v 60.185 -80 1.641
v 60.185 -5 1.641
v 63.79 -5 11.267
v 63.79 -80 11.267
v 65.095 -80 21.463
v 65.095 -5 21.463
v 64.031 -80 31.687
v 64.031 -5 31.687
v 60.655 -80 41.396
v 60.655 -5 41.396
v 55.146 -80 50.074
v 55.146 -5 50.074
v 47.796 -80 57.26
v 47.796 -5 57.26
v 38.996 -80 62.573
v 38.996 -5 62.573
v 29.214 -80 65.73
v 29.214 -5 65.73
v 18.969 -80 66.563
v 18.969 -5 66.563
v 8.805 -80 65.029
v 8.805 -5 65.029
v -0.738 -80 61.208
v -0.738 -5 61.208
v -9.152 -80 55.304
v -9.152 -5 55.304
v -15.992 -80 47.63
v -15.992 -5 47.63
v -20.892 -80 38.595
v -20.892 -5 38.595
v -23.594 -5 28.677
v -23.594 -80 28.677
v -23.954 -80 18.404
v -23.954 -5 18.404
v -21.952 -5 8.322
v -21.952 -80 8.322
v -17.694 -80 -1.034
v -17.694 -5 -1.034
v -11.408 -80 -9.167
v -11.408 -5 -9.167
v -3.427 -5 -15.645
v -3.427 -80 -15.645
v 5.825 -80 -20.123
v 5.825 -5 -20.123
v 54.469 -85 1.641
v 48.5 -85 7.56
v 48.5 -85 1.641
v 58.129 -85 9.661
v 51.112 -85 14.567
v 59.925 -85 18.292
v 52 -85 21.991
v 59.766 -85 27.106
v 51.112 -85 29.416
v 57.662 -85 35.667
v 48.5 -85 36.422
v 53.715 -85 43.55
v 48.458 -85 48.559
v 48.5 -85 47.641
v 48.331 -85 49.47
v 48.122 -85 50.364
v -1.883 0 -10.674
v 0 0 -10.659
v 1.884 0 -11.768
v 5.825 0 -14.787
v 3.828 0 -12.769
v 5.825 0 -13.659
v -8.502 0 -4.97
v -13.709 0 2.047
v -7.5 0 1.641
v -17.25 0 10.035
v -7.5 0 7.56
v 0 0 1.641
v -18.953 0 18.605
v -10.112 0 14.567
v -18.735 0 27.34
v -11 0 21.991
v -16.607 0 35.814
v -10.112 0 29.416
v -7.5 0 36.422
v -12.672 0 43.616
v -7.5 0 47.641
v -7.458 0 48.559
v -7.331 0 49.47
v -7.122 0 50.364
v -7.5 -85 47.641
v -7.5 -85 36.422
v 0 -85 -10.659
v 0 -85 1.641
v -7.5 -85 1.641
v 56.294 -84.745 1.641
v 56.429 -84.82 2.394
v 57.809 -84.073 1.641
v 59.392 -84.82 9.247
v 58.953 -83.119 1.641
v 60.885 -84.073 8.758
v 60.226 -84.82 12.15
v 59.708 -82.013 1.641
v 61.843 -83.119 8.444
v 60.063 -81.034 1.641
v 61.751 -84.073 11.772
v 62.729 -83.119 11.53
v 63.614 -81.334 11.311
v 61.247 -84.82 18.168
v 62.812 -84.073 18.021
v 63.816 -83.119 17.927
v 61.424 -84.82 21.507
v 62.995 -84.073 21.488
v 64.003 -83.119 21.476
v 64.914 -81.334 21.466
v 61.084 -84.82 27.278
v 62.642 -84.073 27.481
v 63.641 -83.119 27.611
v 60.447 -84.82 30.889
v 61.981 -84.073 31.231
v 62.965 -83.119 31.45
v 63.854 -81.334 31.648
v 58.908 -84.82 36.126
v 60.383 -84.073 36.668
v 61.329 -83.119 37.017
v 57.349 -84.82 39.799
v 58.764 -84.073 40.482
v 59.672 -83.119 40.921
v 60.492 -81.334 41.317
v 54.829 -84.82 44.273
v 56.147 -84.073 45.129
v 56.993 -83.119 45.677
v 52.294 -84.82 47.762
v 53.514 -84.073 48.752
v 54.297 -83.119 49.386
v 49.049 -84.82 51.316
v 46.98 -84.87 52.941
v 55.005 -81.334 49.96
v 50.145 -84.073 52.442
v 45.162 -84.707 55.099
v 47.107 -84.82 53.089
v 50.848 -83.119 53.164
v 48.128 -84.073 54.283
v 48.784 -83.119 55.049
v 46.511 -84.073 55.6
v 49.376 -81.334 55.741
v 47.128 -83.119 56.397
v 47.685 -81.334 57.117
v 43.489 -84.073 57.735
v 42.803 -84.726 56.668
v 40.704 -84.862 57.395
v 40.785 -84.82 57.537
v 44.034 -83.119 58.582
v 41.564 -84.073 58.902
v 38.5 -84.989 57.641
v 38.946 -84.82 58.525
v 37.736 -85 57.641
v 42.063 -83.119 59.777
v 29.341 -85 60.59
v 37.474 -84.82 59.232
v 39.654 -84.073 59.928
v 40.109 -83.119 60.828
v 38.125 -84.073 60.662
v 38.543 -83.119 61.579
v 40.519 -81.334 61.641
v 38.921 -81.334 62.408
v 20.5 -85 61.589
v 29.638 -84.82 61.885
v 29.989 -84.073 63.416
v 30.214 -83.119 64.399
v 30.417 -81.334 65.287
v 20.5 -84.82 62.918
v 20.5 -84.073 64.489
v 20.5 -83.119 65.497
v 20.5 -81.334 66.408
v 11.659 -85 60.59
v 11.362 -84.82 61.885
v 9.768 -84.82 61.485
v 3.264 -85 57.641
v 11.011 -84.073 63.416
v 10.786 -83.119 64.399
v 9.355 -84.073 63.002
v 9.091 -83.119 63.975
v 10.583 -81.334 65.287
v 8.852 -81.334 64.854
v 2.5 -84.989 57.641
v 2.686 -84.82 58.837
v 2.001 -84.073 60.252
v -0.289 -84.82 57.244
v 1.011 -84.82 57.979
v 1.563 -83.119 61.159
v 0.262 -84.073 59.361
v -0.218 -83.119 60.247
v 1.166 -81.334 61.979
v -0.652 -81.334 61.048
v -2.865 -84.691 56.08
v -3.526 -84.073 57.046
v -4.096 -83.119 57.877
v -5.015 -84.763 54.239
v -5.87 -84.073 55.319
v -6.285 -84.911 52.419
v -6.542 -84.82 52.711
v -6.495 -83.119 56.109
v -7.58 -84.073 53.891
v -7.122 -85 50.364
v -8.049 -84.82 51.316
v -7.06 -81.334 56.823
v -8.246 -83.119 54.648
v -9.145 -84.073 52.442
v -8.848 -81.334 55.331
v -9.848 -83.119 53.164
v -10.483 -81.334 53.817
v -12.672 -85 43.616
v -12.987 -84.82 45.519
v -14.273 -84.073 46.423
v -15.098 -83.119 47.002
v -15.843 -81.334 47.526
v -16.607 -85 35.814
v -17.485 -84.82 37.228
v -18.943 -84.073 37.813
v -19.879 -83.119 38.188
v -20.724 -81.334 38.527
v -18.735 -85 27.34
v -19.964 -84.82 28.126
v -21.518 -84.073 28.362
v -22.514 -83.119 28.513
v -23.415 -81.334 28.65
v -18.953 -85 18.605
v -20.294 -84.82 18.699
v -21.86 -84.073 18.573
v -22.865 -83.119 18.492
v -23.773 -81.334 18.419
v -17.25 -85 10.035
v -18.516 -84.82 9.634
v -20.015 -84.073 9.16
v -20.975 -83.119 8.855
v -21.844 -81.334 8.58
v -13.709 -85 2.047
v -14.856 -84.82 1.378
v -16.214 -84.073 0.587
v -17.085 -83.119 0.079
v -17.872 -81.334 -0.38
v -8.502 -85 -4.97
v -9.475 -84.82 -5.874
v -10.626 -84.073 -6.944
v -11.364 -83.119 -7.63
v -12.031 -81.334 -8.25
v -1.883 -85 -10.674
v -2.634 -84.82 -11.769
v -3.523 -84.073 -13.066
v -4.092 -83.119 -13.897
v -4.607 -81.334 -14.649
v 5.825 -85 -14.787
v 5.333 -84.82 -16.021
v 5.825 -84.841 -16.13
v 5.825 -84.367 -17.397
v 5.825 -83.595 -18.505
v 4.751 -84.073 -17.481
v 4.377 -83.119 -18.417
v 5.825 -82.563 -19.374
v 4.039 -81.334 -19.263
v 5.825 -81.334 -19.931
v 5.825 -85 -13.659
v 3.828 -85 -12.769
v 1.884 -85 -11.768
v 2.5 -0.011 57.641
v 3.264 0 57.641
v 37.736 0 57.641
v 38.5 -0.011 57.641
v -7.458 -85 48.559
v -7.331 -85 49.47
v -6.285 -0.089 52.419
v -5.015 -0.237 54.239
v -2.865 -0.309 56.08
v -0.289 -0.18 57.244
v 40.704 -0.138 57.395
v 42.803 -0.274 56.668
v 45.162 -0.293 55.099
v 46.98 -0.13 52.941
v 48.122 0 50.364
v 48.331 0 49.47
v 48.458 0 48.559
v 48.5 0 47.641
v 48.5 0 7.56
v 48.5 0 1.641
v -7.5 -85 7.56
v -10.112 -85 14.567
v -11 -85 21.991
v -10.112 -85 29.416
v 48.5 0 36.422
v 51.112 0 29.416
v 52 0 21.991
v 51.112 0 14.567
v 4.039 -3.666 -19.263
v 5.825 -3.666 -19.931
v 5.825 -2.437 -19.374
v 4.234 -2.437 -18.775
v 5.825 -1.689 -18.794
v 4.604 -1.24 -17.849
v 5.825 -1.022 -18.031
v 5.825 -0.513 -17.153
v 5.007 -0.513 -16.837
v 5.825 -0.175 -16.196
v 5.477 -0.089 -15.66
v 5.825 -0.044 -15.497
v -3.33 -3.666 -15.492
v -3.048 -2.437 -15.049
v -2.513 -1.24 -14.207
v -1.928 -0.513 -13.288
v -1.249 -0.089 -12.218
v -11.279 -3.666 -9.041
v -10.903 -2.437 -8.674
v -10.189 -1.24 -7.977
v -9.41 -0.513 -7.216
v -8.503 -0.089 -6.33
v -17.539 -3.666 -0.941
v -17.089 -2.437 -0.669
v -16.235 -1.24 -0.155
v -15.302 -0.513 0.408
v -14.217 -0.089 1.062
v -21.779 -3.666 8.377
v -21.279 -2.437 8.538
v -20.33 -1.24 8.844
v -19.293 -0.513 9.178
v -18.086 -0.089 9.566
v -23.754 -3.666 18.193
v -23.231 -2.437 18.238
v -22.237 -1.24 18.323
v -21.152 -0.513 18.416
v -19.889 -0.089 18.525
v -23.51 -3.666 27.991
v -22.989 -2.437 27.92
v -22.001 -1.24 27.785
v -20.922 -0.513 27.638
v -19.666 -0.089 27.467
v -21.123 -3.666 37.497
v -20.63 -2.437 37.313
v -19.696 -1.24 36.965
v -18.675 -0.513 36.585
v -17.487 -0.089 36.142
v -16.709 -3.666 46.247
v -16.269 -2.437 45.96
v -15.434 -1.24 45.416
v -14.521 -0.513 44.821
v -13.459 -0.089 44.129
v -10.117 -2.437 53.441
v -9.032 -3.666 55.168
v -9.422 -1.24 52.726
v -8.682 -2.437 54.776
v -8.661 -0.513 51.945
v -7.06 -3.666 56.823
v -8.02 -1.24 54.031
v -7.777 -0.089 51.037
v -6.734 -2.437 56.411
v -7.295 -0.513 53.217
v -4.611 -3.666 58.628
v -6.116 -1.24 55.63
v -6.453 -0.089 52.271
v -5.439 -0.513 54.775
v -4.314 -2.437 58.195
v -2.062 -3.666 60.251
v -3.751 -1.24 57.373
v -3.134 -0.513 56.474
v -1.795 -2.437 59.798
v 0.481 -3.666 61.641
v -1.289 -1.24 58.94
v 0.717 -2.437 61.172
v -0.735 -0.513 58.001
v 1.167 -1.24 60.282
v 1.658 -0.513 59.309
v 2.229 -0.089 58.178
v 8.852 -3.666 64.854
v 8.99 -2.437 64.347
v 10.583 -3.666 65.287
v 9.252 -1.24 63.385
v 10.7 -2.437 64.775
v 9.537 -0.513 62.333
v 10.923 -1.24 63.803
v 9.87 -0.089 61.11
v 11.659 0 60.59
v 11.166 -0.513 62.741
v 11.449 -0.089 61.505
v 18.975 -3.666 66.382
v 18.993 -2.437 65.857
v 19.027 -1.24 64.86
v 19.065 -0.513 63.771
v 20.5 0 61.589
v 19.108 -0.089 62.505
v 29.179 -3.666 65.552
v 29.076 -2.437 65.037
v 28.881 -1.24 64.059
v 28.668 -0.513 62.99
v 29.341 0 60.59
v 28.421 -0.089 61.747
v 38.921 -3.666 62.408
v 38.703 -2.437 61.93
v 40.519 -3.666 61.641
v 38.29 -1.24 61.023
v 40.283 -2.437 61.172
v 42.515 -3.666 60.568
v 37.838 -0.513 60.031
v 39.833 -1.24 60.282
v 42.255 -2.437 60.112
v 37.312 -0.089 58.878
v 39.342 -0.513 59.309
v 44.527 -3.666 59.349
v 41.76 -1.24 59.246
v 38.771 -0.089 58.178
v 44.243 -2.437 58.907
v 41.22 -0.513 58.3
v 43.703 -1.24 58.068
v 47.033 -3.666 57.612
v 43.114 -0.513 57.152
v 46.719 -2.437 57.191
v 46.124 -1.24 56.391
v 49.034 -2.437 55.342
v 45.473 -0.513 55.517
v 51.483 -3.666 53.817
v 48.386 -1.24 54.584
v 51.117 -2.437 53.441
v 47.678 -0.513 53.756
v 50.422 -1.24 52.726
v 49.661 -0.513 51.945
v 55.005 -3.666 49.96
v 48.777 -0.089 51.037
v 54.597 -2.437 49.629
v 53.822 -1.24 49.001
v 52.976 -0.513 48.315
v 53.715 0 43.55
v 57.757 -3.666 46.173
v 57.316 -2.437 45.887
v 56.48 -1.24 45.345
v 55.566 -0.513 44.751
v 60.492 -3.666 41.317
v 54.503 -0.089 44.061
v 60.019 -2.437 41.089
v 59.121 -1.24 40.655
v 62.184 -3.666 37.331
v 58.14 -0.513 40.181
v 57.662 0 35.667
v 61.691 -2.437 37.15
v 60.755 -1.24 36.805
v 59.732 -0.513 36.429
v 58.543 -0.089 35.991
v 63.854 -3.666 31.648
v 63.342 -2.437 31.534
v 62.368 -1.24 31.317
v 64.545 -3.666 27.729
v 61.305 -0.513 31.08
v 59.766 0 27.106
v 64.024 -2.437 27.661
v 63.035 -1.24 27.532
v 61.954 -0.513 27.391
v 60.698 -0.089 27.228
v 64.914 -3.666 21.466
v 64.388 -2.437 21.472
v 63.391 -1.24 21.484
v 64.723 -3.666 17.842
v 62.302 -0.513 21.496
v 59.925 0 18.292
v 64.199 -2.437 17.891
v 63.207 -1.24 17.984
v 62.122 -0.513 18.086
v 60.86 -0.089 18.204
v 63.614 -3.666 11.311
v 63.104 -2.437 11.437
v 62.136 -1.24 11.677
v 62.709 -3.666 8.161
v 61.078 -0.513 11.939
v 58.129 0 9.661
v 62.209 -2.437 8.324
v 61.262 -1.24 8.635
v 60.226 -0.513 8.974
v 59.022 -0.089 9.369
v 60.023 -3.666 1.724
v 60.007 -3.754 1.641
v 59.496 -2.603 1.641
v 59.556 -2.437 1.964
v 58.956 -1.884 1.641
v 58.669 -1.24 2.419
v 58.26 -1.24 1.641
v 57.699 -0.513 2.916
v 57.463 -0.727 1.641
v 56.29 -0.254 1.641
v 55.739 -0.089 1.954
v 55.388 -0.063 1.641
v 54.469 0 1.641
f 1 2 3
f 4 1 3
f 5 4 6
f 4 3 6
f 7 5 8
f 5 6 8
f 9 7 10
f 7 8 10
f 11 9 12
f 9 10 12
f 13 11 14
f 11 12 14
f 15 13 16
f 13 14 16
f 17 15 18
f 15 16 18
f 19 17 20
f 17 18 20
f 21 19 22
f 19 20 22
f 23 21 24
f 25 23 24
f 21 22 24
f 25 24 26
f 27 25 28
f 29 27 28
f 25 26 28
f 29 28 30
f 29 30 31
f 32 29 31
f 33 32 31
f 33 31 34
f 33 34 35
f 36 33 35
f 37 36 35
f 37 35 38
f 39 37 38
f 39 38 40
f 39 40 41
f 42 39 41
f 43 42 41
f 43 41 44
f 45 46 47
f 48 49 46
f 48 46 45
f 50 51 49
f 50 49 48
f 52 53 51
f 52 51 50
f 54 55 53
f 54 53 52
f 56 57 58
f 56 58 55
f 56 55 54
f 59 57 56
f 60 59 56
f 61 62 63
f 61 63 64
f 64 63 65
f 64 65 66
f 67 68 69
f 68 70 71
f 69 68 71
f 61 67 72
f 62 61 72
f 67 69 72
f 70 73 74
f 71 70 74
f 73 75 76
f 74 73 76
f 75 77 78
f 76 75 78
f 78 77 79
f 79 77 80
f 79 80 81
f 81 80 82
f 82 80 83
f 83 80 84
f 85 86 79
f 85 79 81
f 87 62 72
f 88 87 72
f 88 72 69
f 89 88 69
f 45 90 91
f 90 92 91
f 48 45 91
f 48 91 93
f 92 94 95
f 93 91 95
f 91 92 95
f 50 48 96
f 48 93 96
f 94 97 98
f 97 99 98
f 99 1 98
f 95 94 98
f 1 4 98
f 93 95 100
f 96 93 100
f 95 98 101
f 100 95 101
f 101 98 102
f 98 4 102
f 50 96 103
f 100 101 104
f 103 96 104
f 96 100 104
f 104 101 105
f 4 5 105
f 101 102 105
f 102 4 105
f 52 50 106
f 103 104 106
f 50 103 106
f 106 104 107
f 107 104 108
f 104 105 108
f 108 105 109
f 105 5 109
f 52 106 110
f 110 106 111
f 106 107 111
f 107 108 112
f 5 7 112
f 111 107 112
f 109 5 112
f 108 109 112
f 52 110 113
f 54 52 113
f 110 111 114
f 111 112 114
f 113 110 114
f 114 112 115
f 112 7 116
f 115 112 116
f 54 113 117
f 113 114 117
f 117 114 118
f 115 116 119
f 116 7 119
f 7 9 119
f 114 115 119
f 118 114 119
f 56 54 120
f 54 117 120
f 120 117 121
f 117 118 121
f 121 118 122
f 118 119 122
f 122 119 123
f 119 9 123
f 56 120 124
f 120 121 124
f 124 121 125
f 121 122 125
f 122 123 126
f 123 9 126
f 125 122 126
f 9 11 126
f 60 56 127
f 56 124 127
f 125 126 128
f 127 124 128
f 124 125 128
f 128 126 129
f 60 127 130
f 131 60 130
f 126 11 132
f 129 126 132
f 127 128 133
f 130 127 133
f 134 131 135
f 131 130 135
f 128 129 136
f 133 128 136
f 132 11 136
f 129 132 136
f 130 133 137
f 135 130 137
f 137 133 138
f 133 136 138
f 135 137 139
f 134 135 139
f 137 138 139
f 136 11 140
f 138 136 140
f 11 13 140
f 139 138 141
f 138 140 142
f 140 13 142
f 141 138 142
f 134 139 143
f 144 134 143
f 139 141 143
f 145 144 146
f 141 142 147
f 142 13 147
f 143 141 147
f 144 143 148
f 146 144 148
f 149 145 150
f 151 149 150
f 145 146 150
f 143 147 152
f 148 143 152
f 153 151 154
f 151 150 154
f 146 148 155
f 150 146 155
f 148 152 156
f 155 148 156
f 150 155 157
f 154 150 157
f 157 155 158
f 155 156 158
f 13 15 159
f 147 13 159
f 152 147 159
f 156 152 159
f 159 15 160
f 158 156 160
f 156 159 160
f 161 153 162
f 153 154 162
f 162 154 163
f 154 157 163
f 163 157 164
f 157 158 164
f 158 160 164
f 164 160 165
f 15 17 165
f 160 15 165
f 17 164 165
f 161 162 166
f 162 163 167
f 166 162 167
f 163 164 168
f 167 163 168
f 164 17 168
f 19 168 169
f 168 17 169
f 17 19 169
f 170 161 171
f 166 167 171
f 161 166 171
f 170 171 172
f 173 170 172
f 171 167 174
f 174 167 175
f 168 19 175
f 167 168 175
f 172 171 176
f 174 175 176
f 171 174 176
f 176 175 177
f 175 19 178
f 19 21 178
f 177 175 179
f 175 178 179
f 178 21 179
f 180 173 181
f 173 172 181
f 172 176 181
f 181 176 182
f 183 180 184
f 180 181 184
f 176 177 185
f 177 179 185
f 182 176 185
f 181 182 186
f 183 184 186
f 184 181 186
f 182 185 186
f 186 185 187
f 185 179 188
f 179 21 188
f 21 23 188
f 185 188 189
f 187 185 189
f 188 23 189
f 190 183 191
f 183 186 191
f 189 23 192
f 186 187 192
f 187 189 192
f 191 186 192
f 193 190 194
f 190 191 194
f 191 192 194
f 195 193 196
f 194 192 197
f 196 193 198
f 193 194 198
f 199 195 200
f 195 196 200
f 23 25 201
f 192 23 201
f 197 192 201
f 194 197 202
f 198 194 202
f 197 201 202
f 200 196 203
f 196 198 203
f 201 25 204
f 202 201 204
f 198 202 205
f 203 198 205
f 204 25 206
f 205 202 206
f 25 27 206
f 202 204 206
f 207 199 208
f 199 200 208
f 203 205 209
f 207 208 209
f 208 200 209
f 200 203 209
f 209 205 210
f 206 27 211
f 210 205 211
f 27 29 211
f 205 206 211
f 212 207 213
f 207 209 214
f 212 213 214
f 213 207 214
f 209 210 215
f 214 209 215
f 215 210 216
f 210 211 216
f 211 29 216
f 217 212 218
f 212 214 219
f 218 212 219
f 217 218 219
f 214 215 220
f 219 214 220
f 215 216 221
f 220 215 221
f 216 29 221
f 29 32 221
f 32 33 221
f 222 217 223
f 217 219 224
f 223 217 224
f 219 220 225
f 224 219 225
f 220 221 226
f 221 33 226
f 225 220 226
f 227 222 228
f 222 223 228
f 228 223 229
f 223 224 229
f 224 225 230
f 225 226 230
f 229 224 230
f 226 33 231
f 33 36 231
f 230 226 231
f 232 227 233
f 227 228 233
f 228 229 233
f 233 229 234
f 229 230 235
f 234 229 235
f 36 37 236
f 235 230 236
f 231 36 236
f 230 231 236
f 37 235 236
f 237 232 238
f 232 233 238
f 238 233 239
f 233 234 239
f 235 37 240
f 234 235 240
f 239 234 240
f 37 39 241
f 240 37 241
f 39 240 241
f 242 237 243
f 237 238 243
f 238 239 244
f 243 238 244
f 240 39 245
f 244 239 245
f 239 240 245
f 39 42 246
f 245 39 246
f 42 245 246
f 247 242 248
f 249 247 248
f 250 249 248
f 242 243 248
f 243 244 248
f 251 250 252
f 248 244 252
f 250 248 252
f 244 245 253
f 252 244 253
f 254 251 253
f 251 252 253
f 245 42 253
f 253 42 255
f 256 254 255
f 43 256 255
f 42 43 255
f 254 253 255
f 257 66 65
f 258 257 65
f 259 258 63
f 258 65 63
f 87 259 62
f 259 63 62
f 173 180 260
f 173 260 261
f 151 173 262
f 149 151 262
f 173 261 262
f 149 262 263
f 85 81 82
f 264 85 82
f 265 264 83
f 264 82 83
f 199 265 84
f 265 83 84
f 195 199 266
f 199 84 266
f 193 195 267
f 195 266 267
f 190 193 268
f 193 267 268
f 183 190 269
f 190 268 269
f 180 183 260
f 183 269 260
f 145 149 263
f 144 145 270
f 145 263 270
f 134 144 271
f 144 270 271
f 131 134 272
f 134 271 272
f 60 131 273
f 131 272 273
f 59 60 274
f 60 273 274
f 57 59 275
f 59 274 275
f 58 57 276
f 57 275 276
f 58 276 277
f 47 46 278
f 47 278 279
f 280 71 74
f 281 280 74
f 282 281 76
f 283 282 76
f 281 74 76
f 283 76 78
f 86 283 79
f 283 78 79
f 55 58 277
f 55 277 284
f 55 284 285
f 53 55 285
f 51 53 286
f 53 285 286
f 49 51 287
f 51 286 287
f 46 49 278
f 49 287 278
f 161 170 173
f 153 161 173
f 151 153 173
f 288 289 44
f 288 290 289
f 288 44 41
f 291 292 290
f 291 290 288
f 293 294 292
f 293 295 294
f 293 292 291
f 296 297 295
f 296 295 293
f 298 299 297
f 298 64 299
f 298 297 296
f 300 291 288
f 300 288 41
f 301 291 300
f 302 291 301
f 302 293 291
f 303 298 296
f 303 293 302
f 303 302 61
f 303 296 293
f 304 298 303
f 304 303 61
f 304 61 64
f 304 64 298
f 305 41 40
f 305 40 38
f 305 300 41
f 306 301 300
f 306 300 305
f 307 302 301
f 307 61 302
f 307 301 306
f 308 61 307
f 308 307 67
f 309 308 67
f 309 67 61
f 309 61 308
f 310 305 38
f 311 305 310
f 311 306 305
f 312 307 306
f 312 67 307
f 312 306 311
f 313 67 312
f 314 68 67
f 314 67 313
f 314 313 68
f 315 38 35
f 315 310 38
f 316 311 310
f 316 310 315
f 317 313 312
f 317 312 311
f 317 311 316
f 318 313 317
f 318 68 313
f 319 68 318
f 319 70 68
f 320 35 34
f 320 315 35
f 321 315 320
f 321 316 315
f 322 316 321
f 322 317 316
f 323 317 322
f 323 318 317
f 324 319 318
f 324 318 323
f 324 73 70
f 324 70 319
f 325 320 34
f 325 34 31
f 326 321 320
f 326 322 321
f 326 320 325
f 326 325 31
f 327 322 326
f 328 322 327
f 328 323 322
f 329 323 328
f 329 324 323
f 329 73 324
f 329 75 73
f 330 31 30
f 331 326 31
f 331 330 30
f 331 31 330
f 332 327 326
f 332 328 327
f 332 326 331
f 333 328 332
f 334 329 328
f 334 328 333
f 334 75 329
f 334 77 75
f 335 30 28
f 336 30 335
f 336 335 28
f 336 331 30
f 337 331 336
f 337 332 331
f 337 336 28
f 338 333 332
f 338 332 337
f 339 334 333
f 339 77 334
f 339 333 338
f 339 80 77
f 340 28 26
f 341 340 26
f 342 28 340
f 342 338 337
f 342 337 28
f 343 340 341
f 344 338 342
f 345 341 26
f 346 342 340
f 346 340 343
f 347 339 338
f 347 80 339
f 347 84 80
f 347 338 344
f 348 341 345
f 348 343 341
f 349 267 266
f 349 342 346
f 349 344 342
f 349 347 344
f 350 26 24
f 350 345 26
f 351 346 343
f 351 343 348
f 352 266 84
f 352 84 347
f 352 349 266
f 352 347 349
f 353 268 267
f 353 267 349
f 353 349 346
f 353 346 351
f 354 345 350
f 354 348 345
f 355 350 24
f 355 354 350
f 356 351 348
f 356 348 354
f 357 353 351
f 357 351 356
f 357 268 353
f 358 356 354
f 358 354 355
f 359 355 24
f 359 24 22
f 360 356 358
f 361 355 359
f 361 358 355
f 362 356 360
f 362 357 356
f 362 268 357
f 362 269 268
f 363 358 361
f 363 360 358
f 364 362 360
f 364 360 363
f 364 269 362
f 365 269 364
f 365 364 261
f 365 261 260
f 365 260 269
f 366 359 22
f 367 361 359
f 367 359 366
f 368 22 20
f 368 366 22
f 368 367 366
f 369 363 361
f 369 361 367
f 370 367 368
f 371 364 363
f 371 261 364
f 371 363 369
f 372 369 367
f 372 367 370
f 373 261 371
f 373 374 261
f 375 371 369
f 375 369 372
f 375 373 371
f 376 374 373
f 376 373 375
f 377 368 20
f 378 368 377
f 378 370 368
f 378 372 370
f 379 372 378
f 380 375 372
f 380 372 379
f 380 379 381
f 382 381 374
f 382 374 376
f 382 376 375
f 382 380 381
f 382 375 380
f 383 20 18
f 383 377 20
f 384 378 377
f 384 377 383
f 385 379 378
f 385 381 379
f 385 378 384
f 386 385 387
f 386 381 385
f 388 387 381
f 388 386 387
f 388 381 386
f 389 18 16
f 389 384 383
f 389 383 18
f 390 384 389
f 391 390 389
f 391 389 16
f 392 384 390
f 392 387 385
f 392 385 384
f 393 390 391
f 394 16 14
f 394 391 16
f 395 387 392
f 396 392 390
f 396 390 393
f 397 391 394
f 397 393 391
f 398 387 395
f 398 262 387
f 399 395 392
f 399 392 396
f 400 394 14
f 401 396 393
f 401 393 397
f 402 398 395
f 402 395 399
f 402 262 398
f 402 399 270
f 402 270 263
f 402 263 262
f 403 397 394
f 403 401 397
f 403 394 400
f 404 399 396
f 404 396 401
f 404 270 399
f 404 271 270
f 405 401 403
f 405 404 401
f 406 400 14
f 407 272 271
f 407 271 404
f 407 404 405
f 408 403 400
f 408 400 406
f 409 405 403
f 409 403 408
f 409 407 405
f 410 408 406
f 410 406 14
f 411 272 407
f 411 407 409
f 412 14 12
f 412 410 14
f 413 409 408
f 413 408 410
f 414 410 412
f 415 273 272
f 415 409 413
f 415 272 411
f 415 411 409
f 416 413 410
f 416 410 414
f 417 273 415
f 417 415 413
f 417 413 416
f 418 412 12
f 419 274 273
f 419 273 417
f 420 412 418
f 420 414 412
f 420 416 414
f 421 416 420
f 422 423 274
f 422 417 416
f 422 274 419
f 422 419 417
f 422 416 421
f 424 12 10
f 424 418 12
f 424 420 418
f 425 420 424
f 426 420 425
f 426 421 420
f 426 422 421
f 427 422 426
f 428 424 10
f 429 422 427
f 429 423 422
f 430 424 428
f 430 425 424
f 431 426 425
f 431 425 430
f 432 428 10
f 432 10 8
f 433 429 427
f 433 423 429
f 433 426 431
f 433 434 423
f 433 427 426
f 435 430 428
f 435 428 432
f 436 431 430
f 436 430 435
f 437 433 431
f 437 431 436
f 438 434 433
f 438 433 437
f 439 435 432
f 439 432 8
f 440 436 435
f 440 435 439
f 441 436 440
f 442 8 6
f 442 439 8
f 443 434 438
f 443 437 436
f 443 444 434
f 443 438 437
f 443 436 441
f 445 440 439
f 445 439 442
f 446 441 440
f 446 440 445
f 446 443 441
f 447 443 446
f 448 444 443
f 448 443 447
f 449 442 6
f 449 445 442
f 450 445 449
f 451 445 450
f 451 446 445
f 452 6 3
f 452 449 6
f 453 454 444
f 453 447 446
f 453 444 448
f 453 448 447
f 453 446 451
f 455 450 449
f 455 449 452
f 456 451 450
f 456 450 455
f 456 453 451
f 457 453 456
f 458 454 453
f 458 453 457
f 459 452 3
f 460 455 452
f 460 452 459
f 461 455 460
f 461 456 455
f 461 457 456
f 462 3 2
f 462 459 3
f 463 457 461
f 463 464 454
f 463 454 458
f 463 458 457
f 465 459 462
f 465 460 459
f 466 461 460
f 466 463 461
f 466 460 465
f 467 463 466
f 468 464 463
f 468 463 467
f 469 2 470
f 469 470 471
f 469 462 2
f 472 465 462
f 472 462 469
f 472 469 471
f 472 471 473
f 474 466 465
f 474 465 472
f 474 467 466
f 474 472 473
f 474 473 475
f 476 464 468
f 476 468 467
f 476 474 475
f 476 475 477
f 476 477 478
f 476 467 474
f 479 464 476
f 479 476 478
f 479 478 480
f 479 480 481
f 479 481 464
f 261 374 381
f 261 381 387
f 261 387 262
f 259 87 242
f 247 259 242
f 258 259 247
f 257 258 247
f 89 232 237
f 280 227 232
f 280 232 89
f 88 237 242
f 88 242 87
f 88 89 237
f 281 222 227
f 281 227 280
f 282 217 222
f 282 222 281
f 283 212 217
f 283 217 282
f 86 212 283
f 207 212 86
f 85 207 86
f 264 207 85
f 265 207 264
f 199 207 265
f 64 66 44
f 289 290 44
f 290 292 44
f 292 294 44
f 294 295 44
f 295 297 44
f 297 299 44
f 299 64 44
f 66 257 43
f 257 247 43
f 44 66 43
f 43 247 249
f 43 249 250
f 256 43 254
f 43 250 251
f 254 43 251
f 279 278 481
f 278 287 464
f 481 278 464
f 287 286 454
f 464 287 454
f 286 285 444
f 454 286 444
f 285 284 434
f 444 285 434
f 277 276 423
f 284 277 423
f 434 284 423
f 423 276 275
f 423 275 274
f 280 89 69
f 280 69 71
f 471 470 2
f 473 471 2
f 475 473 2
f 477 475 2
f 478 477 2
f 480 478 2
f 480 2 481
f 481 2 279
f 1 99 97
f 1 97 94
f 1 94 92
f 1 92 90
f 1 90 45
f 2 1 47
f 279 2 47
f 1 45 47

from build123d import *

# Parameters (mm, degrees)
F0_R        = 44.59812
F1_DEPTH    = 85
F3_DEPTH    = 85.001
F4_T2_ANGLE = 310.1787489512
F4_T4_ANGLE = 310.1787489512


# Not quite as in the source:
# - a fillet or chamfer that OpenCascade refuses, or shapes differently, is made with other operations: its cross-section is extruded or revolved along the edge and cut away or added


with BuildPart() as f1:
    # F0 (on Front) → F1 (new body)
    with BuildSketch(Plane.XZ):
        with Locations((20.5, 21.991262728)):
            Circle(F0_R)
        with BuildLine():
            ThreePointArc((62.0981215365, 21.991262728), (57.0788738932, 2.1824338865), (43.2323802204, -12.8461109515))
            ThreePointArc((43.2323802204, -12.8461109515), (-16.0788738932, 41.8000915695), (62.0981215365, 21.991262728))
        make_face(mode=Mode.SUBTRACT)
        with BuildLine():
            ThreePointArc((62.0981215365, 21.991262728), (-16.0788738932, 41.8000915695), (43.2323802204, -12.8461109515))
            ThreePointArc((43.2323802204, -12.8461109515), (57.0788738932, 2.1824338865), (62.0981215365, 21.991262728))
        make_face()
        with BuildLine():
            Line((48.5, 7.5603930383), (48.5, 1.641262728))
            Line((48.5, 1.641262728), (45.5, 1.641262728))
            Line((45.5, 1.641262728), (45.5, -8.658737272))
            ThreePointArc((45.5, -8.658737272), (44.896697687, -11.0397138467), (43.2323802204, -12.8461109515))
            ThreePointArc((43.2323802204, -12.8461109515), (41.9253300675, -13.4512767031), (40.5, -13.658737272))
            Line((40.5, -13.658737272), (5.8251916537, -13.658737272))
            ThreePointArc((5.8251916537, -13.658737272), (2.8487454964, -12.2827174093), (0, -10.658737272))
            Line((0, -10.658737272), (0, 1.641262728))
            Line((0, 1.641262728), (-7.5, 1.641262728))
            Line((-7.5, 1.641262728), (-7.5, 7.5603930383))
            ThreePointArc((-7.5, 7.5603930383), (-11, 21.991262728), (-7.5, 36.4221324176))
            Line((-7.5, 36.4221324176), (-7.5, 40.641262728))
            Line((-7.5, 40.641262728), (-7.5, 45.641262728))
            Line((-7.5, 45.641262728), (-7.5, 47.641262728))
            ThreePointArc((-7.5, 47.641262728), (-4.5710678119, 54.7123305398), (2.5, 57.641262728))
            Line((2.5, 57.641262728), (38.5, 57.641262728))
            ThreePointArc((38.5, 57.641262728), (45.5710678119, 54.7123305398), (48.5, 47.641262728))
            Line((48.5, 47.641262728), (48.5, 45.641262728))
            Line((48.5, 45.641262728), (48.5, 40.641262728))
            Line((48.5, 40.641262728), (48.5, 36.4221324176))
            ThreePointArc((48.5, 36.4221324176), (52, 21.991262728), (48.5, 7.5603930383))
        make_face(mode=Mode.SUBTRACT)
    extrude(amount=F1_DEPTH)

    # F2 (on face) → F3 (cut, through all)
    with BuildSketch(Plane.XZ.offset(85)):
        with BuildLine():
            Line((5.8251916537, -13.658737272), (5.8251916537, -20.1233702104))
            ThreePointArc((5.8251916537, -20.1233702104), (37.0770201947, -19.4115718247), (60.1846293612, 1.641262728))
            Line((60.1846293612, 1.641262728), (48.5, 1.641262728))
            Line((48.5, 1.641262728), (45.5, 1.641262728))
            Line((45.5, 1.641262728), (45.5, -8.658737272))
            ThreePointArc((45.5, -8.658737272), (44.0355339059, -12.194271178), (40.5, -13.658737272))
            Line((40.5, -13.658737272), (5.8251916537, -13.658737272))
        make_face()
    extrude(amount=-F3_DEPTH, mode=Mode.SUBTRACT)

    # F4: fillet of radius 5 on 2 edges, made by hand

    # F4_s1 → F4_t2 (revolve, cut)
    with BuildSketch(Plane(origin=(20.6066088897, 0, 21.8909083866), x_dir=(0, 1, 0), z_dir=(-0.6854246842, 0, -0.7281435314))):
        with BuildLine():
            ThreePointArc((-85, 39.4517080838), (-83.5355339059, 42.9872419898), (-80, 44.4517080838))
            Line((-80, 44.4517080838), (-85, 44.4517080838))
            Line((-85, 44.4517080838), (-85, 39.4517080838))
        make_face()
    revolve(axis=Axis((20.5, -85, 21.991262728), (0, -1, 0)), revolution_arc=F4_T2_ANGLE, mode=Mode.SUBTRACT)

    # F4_s3 → F4_t4 (revolve, cut)
    with BuildSketch(Plane(origin=(19.2566159931, 0, -1.0396200852), x_dir=(0, 1, 0), z_dir=(0.998545843, 0, -0.0539091767))):
        with BuildLine():
            ThreePointArc((-5, -21.533697897), (-1.4644660941, -20.0692318029), (0, -16.533697897))
            Line((0, -16.533697897), (0, -21.533697897))
            Line((0, -21.533697897), (-5, -21.533697897))
        make_face()
    revolve(axis=Axis((20.5, 0, 21.991262728), (0, 1, 0)), revolution_arc=F4_T4_ANGLE, mode=Mode.SUBTRACT)


solid = f1.part
